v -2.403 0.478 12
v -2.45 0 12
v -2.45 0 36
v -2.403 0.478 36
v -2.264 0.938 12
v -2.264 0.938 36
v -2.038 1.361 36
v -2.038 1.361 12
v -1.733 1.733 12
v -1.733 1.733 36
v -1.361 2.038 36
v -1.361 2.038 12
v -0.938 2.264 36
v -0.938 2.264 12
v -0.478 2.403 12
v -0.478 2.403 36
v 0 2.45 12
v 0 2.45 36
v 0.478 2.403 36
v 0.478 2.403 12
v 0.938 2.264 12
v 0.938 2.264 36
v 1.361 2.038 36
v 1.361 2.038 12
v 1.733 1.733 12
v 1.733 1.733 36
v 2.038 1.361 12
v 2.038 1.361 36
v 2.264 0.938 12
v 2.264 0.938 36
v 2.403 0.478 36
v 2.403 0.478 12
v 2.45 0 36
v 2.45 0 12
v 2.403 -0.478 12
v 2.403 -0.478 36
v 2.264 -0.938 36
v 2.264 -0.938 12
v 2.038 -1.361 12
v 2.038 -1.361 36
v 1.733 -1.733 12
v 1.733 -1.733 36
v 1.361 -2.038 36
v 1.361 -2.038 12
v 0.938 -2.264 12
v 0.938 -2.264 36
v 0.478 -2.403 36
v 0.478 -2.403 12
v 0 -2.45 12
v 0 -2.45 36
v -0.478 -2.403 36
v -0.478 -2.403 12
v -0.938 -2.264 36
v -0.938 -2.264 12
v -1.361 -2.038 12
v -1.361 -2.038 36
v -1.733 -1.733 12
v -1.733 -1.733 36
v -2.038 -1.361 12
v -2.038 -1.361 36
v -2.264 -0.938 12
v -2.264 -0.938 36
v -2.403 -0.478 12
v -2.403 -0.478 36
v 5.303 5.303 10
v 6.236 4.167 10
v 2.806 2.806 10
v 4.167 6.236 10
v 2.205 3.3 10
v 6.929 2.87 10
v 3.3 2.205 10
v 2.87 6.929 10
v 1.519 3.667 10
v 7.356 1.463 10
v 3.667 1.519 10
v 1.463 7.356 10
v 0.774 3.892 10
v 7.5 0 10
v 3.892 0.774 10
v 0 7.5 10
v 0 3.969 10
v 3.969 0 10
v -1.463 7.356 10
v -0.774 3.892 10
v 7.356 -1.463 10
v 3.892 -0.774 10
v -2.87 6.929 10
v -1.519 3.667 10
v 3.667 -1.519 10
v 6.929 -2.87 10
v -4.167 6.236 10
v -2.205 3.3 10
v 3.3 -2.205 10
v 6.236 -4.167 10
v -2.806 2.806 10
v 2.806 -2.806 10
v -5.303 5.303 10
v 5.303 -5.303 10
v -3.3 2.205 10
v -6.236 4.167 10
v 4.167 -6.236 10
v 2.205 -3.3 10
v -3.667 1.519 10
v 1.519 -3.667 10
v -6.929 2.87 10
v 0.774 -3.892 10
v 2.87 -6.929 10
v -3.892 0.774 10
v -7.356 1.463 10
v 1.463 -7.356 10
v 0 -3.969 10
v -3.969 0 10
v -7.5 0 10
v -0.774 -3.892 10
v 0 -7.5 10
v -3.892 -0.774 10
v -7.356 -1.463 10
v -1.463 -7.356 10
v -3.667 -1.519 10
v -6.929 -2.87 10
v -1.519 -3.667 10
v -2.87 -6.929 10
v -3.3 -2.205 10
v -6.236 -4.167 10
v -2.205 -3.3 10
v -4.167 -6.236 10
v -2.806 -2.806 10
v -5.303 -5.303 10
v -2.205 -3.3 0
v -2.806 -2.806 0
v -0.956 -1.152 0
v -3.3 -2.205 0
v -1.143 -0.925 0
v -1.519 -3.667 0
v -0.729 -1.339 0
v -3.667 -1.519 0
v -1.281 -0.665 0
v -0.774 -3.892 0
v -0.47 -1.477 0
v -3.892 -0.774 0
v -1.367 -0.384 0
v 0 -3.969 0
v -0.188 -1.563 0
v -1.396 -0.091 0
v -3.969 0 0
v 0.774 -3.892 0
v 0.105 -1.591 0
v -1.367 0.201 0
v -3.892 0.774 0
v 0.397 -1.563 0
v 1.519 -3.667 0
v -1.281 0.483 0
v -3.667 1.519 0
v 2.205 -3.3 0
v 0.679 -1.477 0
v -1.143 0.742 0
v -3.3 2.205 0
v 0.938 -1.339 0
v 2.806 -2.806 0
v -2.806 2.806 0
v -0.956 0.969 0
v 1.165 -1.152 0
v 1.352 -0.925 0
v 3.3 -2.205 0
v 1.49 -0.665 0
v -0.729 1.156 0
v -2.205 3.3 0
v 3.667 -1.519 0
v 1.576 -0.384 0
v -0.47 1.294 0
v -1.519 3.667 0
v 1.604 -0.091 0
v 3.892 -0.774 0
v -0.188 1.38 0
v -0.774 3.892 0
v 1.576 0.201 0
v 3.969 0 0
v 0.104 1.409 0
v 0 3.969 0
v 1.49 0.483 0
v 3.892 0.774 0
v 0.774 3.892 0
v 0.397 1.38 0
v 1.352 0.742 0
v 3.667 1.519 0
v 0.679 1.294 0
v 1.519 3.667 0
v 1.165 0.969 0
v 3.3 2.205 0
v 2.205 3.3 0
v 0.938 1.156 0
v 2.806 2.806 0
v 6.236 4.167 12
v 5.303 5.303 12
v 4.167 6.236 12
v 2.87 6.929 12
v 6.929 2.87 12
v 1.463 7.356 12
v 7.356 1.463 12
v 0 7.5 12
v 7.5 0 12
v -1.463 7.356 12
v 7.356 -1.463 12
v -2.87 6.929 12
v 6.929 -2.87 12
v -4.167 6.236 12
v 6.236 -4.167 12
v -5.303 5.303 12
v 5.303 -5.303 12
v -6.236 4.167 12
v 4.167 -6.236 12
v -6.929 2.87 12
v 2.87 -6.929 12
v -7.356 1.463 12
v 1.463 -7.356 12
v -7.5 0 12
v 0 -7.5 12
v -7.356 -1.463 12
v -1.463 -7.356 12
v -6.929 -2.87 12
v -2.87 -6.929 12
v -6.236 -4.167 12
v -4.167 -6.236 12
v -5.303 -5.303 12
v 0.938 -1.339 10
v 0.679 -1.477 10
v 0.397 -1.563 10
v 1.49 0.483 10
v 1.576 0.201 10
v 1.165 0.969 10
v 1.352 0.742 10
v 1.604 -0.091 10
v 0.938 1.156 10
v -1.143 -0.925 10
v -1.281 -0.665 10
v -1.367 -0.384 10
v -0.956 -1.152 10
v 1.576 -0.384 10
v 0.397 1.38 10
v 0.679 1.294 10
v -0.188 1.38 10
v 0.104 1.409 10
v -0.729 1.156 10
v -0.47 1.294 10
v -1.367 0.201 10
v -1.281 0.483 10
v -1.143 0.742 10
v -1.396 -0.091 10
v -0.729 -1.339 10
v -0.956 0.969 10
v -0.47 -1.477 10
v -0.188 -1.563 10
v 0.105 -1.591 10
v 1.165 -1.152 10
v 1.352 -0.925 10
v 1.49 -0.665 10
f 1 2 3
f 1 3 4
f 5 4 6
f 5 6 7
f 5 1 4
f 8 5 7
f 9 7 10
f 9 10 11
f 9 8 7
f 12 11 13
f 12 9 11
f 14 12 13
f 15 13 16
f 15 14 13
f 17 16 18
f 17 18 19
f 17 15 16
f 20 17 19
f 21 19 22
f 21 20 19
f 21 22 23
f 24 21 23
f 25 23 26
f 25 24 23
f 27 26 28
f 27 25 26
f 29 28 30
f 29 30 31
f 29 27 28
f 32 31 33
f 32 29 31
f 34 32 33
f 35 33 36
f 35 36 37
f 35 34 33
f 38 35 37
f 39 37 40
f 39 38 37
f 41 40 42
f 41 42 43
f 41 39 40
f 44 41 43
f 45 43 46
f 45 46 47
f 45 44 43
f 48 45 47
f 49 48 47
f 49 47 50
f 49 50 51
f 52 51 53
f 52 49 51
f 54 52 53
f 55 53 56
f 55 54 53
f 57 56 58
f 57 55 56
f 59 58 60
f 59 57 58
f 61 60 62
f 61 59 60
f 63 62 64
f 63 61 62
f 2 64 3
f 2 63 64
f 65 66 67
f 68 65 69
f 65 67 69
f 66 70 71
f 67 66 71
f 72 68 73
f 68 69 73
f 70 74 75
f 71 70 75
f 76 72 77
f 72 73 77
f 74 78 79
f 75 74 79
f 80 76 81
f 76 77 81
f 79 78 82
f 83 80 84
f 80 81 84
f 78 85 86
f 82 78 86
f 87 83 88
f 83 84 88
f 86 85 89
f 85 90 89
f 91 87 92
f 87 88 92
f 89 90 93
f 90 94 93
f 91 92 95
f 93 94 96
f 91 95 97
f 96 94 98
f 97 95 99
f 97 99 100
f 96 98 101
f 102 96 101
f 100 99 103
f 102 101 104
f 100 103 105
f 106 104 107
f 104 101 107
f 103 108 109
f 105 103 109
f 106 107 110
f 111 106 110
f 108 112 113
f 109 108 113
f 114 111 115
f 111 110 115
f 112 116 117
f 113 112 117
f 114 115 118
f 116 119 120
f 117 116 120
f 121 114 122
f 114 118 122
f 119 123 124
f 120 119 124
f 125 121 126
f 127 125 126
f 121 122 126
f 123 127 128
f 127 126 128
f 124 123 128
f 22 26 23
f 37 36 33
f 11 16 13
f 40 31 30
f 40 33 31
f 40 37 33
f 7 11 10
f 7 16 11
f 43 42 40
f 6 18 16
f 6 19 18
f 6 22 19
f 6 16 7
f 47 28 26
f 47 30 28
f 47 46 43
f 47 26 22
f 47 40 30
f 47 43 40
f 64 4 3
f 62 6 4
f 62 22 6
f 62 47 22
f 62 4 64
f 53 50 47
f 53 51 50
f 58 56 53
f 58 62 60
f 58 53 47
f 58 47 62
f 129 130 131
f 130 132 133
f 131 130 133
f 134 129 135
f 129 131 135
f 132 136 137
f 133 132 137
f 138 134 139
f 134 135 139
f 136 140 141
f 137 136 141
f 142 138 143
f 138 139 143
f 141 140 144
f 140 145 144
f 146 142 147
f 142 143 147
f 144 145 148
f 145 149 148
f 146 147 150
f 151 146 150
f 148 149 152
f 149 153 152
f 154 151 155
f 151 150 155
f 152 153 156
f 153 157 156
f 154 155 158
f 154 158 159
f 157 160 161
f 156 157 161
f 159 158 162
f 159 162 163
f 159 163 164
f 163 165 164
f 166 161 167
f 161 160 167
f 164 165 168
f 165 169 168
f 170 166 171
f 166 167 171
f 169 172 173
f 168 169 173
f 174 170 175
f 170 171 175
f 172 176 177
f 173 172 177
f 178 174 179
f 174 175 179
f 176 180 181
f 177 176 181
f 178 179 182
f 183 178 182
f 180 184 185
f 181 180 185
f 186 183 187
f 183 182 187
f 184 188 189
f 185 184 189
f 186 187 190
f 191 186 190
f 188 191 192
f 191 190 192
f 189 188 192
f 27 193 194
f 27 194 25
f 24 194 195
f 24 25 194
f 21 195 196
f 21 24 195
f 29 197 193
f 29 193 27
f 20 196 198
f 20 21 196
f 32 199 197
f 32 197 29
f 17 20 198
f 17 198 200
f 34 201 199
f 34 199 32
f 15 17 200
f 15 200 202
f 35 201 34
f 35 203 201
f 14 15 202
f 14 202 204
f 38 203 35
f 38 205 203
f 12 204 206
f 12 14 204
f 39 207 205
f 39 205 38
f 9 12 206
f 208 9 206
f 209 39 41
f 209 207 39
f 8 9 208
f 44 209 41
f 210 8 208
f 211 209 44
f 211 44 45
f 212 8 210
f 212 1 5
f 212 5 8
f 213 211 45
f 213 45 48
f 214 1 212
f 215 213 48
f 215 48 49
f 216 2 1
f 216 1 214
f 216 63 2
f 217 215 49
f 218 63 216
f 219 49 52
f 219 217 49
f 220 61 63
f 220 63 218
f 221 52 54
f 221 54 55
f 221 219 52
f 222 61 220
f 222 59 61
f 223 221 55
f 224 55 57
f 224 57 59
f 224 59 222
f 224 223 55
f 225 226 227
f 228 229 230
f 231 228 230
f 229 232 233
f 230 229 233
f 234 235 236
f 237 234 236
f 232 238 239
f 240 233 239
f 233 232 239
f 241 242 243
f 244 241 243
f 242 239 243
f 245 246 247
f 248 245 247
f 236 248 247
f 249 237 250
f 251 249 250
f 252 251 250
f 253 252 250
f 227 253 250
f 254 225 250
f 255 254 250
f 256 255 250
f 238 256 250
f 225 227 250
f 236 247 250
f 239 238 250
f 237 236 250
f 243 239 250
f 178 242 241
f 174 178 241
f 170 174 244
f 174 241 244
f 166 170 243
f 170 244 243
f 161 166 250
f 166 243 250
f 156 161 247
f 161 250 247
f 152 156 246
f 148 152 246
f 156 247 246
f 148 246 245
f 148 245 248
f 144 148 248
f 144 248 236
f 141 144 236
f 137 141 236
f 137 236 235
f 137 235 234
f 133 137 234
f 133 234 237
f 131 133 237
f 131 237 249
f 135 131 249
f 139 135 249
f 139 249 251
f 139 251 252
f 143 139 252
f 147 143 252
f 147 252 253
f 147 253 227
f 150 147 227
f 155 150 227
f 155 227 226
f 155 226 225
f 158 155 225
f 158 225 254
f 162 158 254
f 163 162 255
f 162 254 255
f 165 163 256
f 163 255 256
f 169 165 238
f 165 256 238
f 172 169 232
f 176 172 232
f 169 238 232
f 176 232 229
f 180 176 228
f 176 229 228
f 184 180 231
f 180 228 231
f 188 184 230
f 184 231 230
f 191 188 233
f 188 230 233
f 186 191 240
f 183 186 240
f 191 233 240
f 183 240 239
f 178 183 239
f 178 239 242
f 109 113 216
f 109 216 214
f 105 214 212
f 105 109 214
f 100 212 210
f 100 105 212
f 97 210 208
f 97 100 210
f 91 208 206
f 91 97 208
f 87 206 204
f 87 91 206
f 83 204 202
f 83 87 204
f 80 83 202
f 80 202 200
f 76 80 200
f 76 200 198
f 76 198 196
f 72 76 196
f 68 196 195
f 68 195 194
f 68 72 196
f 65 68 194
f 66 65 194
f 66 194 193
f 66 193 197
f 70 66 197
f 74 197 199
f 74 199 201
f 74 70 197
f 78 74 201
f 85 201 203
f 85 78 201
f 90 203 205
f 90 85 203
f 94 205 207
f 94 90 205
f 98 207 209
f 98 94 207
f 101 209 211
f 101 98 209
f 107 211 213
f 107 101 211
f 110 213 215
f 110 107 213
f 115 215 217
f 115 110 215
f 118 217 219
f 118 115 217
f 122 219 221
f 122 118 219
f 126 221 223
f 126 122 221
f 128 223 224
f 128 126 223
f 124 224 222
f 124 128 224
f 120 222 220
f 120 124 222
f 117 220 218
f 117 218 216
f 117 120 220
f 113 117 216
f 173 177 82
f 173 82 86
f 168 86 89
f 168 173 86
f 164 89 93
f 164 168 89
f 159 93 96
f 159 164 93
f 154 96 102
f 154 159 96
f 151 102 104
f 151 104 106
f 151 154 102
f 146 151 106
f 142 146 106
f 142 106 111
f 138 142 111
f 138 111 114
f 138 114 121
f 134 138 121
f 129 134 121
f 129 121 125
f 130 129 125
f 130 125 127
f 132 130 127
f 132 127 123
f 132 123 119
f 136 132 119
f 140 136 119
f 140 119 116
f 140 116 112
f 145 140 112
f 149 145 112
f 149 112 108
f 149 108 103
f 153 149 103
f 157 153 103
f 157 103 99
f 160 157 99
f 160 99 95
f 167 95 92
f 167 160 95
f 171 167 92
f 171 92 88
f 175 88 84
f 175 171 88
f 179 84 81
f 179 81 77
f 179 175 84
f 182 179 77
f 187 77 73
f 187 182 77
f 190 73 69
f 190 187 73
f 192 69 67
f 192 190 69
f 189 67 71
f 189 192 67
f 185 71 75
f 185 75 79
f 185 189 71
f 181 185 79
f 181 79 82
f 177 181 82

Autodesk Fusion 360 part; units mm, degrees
sketch "Sketch1" plane through (0, 0, 0) normal (0, 0, 1) x (1, 0, 0) in component "Component"
  circle A0 centre (0, 0) radius 3.9687
  dimension "d1" = 7.9375
extrude "Extrude1" add sketch "Sketch1" along normal blind 10 in component "Component"
sketch "Sketch2" plane through (0, 0, 10) normal (0, 0, 1) x (-1, 0, 0) in component "Component"
  circle A0 centre (0, 0) radius 3.9687
  circle A1 centre (0, 0) radius 7.5
  dimension "d4" = 15
extrude "Extrude2" add sketch "Sketch2" along normal blind 2 contours A0 | A1 in component "Component"
sketch "Sketch3" plane through (0, 0, 12) normal (0, 0, 1) x (-1, 0, 0) in component "Component"
  circle A0 centre (0, 0) radius 7.5
  circle A1 centre (0, 0) radius 2.5
  dimension "d7" = 5
extrude "Extrude3" add sketch "Sketch3" along normal blind 24 contours A1 in component "Component"
thread "Thread1" "ISO Metric profile 5.0 M5x0.8 6g" major diameter 4.901 minor diameter 3.9895 pitch 0.8 angle 60 resizes the face on face at (-2.4969, 0.1246, 28) in component "Component"
hole "Hole1" at (0.1045, -0.0914, 0) direction (0, 0, 1) diameter 3 depth 10 tip angle 180 in component "Component"
component "Component" placed x (1, 0, 0) y (0, 1, 0) z (0, 0, 1) at (0, 0, 0)
equation "d1 = ( 5 / 16 ) * 1 in"
